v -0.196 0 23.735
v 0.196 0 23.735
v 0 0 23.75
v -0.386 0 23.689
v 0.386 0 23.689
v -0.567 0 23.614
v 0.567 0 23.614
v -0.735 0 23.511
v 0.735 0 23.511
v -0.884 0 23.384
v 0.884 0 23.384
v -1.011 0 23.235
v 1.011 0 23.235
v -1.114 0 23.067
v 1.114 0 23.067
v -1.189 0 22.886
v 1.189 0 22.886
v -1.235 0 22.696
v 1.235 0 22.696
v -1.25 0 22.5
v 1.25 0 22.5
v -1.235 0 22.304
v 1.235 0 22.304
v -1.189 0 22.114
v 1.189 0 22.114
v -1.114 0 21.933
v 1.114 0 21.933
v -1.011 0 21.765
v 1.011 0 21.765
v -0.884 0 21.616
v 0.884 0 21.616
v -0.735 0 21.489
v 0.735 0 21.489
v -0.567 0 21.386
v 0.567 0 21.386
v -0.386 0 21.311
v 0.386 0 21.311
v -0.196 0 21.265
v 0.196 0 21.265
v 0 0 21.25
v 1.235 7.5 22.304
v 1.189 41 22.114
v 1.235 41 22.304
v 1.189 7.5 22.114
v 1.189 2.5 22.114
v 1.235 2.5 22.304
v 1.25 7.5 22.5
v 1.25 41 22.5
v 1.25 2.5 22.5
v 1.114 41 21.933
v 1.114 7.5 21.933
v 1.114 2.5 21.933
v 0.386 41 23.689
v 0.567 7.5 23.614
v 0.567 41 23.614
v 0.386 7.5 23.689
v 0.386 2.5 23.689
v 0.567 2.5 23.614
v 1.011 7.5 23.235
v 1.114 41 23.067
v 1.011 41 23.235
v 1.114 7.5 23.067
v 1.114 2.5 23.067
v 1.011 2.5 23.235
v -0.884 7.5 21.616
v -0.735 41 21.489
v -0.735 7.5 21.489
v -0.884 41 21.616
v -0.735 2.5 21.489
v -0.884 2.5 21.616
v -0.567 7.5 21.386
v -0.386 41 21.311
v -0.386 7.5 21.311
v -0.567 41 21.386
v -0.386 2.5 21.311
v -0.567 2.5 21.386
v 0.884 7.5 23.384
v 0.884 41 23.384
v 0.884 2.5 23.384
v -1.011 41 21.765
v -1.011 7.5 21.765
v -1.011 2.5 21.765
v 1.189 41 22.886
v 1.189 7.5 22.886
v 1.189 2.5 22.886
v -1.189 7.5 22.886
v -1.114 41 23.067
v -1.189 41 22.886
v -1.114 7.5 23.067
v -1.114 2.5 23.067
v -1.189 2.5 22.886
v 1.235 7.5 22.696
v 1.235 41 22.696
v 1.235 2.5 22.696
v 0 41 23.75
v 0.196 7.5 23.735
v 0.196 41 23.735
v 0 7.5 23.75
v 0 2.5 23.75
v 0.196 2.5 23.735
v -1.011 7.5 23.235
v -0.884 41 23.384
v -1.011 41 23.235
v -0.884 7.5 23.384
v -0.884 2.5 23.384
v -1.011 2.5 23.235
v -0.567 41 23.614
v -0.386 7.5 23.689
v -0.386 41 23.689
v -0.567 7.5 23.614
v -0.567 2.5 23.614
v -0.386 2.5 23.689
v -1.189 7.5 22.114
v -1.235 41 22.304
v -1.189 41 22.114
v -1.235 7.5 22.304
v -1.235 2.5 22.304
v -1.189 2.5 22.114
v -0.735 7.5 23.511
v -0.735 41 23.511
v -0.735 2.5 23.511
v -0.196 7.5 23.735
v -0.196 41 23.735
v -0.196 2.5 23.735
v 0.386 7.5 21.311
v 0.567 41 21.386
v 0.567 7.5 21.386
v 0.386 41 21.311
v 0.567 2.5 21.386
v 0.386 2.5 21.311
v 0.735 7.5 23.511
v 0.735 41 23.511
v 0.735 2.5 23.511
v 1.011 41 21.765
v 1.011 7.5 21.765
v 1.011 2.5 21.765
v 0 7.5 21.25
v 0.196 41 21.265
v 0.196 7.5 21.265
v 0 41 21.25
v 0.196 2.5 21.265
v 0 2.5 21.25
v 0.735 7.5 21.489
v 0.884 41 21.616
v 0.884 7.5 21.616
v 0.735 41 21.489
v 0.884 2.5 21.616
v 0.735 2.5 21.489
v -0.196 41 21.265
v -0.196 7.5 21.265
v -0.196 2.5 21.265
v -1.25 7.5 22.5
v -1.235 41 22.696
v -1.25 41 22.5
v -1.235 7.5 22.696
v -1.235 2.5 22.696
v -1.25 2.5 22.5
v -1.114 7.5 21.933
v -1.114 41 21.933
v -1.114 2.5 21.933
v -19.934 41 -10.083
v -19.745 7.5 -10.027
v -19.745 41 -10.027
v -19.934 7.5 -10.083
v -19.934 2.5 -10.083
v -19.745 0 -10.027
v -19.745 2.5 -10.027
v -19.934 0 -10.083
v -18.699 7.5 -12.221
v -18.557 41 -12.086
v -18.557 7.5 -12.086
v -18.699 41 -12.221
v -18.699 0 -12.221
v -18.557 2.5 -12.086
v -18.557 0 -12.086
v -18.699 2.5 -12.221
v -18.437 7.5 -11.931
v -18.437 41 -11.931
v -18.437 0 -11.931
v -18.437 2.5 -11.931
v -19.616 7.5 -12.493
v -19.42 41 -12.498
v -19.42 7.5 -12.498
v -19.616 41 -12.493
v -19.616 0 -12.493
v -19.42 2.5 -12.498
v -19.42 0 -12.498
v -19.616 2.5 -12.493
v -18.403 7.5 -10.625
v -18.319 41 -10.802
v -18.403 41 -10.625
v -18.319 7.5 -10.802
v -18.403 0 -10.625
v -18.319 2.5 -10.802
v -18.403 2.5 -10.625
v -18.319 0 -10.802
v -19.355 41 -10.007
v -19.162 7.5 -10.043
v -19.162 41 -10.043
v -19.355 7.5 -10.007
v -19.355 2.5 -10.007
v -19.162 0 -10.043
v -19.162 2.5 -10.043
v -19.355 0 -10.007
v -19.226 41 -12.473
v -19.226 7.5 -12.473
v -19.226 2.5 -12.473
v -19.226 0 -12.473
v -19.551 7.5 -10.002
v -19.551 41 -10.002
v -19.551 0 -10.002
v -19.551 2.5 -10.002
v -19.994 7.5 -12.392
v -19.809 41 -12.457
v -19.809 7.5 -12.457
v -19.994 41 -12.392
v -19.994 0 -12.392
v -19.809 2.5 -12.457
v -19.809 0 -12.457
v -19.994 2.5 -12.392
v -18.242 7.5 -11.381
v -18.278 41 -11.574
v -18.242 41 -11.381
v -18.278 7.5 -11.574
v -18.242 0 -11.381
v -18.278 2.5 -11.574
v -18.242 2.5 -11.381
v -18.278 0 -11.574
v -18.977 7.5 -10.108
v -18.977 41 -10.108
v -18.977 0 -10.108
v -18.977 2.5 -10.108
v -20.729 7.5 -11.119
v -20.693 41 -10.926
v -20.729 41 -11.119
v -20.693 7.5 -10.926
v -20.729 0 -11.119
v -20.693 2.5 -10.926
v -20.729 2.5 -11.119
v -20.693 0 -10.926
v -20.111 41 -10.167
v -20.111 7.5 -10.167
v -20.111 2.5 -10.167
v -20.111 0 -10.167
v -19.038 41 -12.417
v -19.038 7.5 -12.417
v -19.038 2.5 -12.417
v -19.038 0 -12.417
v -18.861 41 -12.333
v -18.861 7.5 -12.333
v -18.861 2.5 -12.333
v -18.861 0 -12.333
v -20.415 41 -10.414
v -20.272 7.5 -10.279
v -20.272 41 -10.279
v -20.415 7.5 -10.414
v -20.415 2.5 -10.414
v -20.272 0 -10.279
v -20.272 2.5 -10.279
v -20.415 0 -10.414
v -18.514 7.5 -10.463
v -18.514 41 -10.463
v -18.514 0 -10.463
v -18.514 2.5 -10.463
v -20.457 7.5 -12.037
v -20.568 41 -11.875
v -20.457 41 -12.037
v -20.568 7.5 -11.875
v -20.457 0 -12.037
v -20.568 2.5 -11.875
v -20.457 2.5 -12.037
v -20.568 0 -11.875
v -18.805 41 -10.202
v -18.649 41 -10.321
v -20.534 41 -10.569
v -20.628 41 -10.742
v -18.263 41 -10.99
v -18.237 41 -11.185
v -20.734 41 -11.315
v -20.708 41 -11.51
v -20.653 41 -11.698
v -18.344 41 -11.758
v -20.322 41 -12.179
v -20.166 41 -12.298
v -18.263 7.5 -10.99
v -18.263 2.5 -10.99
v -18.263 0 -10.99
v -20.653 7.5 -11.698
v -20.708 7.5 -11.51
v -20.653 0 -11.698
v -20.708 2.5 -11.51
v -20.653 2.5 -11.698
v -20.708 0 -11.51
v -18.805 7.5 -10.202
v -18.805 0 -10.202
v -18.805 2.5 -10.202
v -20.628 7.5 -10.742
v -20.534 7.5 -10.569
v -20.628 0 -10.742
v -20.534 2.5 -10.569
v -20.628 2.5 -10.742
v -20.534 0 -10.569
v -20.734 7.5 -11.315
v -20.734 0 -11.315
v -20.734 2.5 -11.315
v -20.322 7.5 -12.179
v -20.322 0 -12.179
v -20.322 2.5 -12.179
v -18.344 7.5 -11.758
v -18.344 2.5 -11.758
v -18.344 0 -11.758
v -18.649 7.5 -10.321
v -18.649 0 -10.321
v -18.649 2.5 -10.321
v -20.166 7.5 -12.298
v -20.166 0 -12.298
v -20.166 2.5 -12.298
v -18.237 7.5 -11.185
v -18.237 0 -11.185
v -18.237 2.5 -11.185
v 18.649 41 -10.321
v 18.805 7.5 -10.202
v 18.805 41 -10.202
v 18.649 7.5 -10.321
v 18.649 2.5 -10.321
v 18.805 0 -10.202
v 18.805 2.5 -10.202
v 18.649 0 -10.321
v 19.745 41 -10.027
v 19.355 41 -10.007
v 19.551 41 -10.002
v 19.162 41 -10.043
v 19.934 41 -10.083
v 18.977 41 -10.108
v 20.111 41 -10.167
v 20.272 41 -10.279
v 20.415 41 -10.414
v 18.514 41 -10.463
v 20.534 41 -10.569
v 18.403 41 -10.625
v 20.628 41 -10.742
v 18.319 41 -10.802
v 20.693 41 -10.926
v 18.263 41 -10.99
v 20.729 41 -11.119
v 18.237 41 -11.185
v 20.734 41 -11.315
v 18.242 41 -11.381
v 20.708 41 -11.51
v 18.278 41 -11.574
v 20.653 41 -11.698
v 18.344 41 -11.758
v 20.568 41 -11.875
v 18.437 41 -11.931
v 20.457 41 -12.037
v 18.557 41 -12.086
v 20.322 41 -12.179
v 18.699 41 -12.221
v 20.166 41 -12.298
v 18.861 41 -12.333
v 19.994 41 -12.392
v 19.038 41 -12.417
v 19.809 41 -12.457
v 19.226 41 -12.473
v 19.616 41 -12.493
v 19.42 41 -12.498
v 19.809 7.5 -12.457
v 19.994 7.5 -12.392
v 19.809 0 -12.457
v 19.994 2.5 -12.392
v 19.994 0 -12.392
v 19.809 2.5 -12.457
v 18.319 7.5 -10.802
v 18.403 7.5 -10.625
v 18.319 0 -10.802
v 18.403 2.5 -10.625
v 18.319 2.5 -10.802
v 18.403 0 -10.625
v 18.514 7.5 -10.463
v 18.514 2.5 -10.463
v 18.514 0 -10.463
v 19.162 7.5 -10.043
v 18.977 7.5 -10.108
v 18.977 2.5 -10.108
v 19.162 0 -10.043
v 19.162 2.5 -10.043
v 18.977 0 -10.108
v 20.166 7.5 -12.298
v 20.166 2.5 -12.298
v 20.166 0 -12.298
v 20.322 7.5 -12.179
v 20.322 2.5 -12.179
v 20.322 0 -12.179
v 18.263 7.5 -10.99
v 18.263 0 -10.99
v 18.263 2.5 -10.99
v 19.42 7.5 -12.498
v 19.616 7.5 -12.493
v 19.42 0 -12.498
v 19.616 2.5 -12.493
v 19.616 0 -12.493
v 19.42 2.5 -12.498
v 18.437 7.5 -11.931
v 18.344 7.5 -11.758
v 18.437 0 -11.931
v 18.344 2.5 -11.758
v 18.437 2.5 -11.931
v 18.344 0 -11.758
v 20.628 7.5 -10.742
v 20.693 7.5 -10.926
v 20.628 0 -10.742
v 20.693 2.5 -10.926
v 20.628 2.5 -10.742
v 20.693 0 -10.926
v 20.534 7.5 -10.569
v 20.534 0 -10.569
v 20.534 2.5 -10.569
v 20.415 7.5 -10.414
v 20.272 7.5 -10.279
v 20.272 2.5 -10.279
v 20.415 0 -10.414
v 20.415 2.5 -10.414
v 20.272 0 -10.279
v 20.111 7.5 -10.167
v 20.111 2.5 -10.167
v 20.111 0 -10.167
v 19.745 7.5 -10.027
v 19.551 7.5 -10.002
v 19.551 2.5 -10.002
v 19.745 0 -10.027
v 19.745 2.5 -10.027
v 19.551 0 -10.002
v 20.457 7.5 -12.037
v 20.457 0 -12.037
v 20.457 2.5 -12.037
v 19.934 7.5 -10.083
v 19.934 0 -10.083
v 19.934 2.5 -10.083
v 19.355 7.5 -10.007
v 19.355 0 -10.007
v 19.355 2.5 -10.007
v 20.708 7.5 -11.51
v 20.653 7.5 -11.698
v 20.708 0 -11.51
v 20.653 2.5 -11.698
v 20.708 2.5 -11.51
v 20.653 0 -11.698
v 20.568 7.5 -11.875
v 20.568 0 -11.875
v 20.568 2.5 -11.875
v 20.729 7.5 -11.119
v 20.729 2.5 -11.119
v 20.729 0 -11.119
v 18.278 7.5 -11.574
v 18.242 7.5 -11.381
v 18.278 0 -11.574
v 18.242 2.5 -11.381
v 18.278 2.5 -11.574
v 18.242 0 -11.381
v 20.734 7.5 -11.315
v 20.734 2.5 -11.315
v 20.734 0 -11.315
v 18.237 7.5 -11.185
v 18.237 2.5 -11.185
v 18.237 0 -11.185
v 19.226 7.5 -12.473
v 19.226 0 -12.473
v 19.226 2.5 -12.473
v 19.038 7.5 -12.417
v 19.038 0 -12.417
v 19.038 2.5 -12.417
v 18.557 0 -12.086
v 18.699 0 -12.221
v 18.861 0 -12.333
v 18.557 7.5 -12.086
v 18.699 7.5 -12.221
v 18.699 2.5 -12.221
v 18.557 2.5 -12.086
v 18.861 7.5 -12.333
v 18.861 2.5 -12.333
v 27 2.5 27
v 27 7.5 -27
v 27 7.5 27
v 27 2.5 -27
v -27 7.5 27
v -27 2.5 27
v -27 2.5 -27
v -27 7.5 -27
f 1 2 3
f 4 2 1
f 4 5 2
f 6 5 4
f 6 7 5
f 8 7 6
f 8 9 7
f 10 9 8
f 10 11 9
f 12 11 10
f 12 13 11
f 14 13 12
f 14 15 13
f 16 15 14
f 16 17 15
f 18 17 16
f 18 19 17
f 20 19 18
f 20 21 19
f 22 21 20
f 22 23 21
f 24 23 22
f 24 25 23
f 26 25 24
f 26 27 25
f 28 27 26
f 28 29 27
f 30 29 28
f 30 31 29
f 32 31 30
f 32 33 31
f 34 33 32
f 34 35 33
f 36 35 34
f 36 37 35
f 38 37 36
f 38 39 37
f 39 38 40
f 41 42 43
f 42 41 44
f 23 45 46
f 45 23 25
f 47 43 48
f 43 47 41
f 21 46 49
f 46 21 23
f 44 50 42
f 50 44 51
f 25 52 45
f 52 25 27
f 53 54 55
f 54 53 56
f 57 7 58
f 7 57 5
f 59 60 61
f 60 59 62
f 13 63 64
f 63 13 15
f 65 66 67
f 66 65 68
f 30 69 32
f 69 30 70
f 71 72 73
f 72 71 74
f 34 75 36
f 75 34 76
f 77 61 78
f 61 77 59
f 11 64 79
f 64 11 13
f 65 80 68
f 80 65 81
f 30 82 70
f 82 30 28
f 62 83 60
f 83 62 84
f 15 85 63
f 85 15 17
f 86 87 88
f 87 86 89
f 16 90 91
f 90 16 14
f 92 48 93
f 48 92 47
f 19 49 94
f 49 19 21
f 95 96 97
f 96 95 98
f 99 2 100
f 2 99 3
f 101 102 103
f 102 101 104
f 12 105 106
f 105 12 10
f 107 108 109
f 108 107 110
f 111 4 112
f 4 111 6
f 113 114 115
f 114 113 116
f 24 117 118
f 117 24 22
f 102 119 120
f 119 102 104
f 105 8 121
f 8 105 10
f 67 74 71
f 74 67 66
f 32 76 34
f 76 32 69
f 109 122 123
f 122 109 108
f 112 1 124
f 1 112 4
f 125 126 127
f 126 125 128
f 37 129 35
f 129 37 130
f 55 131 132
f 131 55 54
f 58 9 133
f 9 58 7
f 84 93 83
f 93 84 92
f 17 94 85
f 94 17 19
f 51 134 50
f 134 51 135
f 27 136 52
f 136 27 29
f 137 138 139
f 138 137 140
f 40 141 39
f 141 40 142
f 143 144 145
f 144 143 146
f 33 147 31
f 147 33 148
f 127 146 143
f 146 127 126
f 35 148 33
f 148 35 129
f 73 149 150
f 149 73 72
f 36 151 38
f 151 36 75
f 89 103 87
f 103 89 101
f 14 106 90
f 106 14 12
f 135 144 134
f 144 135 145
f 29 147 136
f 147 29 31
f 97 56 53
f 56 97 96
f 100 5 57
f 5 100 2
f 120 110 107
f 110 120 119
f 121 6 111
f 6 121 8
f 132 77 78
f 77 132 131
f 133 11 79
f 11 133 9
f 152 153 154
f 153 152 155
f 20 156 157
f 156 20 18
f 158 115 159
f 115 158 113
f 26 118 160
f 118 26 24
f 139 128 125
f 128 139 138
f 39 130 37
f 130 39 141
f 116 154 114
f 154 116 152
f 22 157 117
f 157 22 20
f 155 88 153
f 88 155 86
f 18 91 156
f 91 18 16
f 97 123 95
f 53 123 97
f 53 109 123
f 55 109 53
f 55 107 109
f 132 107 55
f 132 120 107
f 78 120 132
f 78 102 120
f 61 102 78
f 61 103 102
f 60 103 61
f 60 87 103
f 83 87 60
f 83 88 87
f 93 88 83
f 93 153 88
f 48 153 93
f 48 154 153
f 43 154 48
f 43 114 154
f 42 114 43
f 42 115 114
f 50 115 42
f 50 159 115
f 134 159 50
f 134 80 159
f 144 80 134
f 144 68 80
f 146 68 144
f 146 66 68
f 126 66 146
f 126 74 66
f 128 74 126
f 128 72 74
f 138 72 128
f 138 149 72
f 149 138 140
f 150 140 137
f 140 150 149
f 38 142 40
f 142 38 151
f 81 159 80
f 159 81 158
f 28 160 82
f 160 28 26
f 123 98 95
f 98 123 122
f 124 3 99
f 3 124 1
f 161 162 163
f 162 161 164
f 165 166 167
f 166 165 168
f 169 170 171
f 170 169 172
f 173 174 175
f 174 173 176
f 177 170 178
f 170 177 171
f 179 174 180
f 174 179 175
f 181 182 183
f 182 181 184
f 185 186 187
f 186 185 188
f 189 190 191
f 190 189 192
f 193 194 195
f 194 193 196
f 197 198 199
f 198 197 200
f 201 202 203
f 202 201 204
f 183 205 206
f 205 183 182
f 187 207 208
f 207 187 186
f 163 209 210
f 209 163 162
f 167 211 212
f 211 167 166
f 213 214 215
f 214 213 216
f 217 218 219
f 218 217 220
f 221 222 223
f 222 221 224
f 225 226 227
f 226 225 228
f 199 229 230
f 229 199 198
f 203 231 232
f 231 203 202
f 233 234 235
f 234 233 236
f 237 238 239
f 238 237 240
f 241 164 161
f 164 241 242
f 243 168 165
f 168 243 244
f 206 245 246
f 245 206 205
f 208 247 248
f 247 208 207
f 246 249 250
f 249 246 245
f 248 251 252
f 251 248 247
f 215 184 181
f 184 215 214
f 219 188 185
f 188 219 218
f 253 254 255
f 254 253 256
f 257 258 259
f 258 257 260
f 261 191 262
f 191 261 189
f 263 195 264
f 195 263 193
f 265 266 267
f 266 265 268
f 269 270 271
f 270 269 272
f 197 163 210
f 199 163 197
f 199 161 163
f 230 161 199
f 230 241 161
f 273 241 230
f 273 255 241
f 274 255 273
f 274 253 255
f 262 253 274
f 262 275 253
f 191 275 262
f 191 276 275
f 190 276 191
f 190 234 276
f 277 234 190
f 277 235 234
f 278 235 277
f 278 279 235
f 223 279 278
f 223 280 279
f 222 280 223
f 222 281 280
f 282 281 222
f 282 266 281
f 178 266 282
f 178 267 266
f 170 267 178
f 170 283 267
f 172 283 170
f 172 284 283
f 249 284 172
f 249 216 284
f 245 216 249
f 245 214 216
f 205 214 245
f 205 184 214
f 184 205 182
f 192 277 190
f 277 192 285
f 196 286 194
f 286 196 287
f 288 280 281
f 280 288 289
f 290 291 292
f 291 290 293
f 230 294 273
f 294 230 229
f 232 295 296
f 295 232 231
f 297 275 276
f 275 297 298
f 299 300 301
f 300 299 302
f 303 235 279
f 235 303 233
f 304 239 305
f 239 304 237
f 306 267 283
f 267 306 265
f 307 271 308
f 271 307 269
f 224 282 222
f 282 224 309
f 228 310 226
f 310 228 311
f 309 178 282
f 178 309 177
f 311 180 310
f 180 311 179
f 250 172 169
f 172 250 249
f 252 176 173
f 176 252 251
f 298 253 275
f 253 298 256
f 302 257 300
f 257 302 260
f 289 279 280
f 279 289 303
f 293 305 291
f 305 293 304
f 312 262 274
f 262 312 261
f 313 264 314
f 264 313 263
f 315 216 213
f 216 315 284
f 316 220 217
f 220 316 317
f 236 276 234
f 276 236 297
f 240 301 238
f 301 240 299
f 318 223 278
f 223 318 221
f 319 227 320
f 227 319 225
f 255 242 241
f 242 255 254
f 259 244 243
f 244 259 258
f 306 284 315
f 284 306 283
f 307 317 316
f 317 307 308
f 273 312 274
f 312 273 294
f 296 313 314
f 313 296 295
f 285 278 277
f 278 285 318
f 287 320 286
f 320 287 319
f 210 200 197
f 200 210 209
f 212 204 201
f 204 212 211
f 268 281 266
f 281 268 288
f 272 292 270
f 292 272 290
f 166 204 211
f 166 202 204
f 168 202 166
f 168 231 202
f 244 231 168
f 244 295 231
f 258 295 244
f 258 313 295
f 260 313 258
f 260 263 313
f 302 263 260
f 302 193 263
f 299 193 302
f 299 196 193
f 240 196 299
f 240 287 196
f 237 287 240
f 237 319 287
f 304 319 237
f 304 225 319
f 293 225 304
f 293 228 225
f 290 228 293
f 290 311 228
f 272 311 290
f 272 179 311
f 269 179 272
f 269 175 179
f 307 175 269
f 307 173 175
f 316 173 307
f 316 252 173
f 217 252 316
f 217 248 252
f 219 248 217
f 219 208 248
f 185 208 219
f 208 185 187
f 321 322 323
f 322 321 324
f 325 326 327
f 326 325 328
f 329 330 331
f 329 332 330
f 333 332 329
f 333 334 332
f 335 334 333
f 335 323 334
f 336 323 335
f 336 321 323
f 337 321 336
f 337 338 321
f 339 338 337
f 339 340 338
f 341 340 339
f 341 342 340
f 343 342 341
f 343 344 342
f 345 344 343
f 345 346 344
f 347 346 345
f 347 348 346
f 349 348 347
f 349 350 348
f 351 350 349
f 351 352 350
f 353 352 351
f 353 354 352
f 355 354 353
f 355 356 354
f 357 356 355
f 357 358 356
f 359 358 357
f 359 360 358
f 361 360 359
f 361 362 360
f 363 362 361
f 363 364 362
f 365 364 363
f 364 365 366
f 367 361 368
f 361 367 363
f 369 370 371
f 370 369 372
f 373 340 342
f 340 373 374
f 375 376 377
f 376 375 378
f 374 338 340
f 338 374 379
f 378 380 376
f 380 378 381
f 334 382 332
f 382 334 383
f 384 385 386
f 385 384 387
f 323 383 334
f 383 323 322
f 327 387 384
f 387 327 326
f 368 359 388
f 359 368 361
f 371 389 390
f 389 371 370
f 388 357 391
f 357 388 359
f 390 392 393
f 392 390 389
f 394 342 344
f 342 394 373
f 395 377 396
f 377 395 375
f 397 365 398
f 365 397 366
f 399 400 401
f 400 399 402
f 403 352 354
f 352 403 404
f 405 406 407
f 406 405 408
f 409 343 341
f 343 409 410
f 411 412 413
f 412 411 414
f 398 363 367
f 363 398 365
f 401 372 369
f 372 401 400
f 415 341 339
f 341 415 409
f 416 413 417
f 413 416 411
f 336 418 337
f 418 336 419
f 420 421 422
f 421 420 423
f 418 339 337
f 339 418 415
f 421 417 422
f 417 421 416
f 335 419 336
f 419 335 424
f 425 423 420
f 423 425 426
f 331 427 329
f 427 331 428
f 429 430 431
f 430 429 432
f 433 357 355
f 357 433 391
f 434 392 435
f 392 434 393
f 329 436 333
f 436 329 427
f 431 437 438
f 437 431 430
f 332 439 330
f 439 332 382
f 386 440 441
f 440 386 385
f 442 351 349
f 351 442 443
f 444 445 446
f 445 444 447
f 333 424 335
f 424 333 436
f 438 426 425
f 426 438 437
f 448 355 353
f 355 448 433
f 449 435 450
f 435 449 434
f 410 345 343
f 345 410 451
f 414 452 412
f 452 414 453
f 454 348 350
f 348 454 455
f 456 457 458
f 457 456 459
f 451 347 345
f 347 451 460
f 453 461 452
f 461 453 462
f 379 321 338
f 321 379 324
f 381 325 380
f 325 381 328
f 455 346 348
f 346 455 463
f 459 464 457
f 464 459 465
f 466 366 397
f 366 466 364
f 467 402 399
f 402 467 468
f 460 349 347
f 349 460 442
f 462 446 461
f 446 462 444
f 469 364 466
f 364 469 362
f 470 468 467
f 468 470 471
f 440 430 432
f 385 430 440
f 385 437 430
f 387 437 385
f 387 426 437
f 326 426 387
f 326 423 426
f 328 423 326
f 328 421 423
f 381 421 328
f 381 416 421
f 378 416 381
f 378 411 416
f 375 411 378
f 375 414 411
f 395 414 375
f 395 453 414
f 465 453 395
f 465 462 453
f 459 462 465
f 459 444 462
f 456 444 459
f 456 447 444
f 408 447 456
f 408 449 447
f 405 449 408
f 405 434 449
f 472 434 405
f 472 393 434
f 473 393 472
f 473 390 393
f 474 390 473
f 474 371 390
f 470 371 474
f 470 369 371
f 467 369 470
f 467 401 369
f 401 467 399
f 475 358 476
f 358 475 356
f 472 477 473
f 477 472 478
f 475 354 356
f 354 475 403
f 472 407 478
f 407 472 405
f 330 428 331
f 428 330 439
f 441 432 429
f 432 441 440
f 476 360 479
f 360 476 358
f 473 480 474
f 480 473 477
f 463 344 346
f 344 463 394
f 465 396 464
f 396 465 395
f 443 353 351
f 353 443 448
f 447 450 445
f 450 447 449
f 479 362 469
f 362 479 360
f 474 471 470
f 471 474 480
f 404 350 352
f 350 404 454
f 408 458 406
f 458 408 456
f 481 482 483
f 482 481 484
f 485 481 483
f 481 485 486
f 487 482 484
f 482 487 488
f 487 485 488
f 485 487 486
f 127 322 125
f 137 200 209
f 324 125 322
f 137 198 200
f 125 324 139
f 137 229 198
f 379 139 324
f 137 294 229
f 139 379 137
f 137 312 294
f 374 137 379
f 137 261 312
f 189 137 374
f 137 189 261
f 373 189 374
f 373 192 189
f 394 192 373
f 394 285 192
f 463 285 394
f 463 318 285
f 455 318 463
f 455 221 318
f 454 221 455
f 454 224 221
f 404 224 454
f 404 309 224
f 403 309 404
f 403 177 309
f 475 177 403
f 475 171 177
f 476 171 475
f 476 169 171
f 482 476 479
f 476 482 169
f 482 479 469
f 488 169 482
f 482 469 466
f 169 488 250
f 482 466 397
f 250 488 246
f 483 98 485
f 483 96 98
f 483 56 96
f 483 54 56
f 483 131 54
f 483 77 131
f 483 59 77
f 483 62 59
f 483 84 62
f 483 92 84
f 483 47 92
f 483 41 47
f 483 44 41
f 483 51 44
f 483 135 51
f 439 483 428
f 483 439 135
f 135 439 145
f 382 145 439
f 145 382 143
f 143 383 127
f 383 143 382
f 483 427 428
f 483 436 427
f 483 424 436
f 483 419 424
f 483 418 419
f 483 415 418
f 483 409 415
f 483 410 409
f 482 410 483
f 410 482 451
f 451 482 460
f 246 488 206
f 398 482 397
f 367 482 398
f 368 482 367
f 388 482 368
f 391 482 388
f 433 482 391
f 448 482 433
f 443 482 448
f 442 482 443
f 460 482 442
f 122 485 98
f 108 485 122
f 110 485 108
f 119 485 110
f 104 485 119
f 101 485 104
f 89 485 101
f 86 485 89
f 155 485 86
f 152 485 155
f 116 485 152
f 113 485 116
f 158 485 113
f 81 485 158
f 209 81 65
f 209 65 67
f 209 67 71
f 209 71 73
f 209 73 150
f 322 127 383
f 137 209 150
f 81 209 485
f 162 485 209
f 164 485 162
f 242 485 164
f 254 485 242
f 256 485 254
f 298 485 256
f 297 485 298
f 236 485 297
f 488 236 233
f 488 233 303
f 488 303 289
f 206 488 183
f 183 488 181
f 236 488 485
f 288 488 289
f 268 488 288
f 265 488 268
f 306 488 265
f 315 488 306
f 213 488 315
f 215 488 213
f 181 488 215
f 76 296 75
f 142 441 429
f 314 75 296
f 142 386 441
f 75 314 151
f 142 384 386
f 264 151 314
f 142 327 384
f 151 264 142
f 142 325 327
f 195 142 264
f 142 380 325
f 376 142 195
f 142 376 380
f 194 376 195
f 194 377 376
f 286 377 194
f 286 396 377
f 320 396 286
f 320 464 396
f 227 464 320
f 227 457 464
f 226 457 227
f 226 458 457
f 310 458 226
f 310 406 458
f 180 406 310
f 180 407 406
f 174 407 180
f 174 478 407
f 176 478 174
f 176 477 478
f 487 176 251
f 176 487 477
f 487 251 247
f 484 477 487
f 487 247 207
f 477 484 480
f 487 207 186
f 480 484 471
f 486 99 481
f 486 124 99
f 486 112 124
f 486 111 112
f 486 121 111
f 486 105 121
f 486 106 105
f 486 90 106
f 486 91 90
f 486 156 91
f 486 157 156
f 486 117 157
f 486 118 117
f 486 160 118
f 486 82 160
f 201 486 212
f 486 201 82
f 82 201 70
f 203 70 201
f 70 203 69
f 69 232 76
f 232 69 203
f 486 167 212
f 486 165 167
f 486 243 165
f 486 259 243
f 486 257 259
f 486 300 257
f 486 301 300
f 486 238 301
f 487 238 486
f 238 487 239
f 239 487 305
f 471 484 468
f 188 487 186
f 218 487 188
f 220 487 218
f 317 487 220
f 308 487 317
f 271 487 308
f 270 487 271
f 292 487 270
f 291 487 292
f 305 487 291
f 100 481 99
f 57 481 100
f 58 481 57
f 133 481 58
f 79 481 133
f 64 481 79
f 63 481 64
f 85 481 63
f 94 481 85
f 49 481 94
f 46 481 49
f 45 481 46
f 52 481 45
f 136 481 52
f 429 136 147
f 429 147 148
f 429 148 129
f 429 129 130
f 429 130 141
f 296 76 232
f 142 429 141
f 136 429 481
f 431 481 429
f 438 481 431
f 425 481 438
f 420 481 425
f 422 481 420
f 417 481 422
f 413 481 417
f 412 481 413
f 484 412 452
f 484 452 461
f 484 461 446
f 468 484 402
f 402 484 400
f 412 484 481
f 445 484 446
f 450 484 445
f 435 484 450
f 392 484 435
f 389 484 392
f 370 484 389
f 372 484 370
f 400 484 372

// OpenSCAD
// file: reference_Dashcam_holder.scad
// Size
//Naming
// _PT = printable
// _ES = exact size
// _IS = insertable with force but no gaps



//--------------dashcam  (DC)
//---- Diameter from top to bottom (full size) (TB)
DC_TB_Diameter_ES = 38.4;
DC_TB_Diameter_PT = 41;
DC_TB_Radius_PT = DC_TB_Diameter_PT/2;

//---- Diameter from lens to back (LB)
DC_LB_Diameter_ES = 34.4;

//---- Diameter lens (LE)
DC_LE_Diameter_ES = 17.2;

//--------------cable  (CB)
//---- Diameter around the cable (CB)
CB_CB_Diameter_ES = 10;
//add enough room to move the cam 

CB_CB_Diameter_PT = 20;

//--------------screw (SC)
SC_Diameter_ES  = 2;
SC_Diameter_IS  = 2.5;


//--------------thickness 
thickness_object = 4;
// main file
include <reference_Dashcam_holder.scad>


module back_plate(){
     translate([0,5,0]){
         cube([DC_TB_Diameter_PT+thickness_object*2+5,5,DC_TB_Diameter_PT+thickness_object*2+5],center = true);
     }
}

module hole_for_screws(){
    color("green") translate([0,0,DC_TB_Radius_PT+(thickness_object/2)])rotate([270,0,0]){cylinder(h=DC_TB_Diameter_PT, d=SC_Diameter_IS, $fn=40);}


color("green")  rotate([-90,-30,0])translate([-(DC_TB_Radius_PT+(thickness_object/2)),0,0]){cylinder(h=DC_TB_Diameter_PT, d=SC_Diameter_IS, $fn=40);}
color("green")  rotate([-90,210,0])translate([-(DC_TB_Radius_PT+(thickness_object/2)),0,0]){cylinder(h=DC_TB_Diameter_PT, d=SC_Diameter_IS, $fn=40);}
    }
    
    
 module main(){
     difference(){
         back_plate();
         hole_for_screws();
     }
 }
 
 main();
 hole_for_screws();
 
 
